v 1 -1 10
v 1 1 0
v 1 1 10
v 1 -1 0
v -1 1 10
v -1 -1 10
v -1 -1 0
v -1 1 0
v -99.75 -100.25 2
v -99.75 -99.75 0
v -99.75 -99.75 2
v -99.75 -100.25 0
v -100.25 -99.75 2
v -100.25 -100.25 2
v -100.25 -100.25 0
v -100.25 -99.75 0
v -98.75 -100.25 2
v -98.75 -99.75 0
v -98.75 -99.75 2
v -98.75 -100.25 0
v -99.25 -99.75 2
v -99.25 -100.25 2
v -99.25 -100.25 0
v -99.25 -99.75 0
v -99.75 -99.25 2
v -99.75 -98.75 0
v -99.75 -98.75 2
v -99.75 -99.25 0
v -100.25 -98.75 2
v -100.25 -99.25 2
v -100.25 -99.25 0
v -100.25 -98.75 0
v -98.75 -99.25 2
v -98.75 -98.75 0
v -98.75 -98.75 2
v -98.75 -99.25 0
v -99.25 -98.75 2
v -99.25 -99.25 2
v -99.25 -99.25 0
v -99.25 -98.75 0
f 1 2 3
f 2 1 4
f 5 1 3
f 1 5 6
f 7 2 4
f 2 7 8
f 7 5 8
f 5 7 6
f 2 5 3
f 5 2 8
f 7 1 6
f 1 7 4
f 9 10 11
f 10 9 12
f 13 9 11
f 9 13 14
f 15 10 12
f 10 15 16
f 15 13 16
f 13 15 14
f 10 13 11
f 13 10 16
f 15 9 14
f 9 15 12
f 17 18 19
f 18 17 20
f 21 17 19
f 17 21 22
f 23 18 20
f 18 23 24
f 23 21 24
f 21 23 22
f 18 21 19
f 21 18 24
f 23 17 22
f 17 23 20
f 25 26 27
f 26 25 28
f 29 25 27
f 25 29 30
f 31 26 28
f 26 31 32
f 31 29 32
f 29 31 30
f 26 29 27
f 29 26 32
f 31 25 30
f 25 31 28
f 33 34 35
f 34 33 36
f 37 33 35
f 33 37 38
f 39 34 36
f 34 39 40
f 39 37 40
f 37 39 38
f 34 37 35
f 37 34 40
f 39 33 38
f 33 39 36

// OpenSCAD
translate([0, 0, 5]) color([0,1,0,0.9]) cube([2, 2, 10], center=true);
translate([-100.0, -100.0, 1]) color([1,0,0]) cube([0.5, 0.5, 2], center=true);
translate([-99.0, -100.0, 1]) color([1,0,0]) cube([0.5, 0.5, 2], center=true);
translate([-100.0, -99.0, 1]) color([1,0,0]) cube([0.5, 0.5, 2], center=true);
translate([-99.0, -99.0, 1]) color([1,0,0]) cube([0.5, 0.5, 2], center=true);
